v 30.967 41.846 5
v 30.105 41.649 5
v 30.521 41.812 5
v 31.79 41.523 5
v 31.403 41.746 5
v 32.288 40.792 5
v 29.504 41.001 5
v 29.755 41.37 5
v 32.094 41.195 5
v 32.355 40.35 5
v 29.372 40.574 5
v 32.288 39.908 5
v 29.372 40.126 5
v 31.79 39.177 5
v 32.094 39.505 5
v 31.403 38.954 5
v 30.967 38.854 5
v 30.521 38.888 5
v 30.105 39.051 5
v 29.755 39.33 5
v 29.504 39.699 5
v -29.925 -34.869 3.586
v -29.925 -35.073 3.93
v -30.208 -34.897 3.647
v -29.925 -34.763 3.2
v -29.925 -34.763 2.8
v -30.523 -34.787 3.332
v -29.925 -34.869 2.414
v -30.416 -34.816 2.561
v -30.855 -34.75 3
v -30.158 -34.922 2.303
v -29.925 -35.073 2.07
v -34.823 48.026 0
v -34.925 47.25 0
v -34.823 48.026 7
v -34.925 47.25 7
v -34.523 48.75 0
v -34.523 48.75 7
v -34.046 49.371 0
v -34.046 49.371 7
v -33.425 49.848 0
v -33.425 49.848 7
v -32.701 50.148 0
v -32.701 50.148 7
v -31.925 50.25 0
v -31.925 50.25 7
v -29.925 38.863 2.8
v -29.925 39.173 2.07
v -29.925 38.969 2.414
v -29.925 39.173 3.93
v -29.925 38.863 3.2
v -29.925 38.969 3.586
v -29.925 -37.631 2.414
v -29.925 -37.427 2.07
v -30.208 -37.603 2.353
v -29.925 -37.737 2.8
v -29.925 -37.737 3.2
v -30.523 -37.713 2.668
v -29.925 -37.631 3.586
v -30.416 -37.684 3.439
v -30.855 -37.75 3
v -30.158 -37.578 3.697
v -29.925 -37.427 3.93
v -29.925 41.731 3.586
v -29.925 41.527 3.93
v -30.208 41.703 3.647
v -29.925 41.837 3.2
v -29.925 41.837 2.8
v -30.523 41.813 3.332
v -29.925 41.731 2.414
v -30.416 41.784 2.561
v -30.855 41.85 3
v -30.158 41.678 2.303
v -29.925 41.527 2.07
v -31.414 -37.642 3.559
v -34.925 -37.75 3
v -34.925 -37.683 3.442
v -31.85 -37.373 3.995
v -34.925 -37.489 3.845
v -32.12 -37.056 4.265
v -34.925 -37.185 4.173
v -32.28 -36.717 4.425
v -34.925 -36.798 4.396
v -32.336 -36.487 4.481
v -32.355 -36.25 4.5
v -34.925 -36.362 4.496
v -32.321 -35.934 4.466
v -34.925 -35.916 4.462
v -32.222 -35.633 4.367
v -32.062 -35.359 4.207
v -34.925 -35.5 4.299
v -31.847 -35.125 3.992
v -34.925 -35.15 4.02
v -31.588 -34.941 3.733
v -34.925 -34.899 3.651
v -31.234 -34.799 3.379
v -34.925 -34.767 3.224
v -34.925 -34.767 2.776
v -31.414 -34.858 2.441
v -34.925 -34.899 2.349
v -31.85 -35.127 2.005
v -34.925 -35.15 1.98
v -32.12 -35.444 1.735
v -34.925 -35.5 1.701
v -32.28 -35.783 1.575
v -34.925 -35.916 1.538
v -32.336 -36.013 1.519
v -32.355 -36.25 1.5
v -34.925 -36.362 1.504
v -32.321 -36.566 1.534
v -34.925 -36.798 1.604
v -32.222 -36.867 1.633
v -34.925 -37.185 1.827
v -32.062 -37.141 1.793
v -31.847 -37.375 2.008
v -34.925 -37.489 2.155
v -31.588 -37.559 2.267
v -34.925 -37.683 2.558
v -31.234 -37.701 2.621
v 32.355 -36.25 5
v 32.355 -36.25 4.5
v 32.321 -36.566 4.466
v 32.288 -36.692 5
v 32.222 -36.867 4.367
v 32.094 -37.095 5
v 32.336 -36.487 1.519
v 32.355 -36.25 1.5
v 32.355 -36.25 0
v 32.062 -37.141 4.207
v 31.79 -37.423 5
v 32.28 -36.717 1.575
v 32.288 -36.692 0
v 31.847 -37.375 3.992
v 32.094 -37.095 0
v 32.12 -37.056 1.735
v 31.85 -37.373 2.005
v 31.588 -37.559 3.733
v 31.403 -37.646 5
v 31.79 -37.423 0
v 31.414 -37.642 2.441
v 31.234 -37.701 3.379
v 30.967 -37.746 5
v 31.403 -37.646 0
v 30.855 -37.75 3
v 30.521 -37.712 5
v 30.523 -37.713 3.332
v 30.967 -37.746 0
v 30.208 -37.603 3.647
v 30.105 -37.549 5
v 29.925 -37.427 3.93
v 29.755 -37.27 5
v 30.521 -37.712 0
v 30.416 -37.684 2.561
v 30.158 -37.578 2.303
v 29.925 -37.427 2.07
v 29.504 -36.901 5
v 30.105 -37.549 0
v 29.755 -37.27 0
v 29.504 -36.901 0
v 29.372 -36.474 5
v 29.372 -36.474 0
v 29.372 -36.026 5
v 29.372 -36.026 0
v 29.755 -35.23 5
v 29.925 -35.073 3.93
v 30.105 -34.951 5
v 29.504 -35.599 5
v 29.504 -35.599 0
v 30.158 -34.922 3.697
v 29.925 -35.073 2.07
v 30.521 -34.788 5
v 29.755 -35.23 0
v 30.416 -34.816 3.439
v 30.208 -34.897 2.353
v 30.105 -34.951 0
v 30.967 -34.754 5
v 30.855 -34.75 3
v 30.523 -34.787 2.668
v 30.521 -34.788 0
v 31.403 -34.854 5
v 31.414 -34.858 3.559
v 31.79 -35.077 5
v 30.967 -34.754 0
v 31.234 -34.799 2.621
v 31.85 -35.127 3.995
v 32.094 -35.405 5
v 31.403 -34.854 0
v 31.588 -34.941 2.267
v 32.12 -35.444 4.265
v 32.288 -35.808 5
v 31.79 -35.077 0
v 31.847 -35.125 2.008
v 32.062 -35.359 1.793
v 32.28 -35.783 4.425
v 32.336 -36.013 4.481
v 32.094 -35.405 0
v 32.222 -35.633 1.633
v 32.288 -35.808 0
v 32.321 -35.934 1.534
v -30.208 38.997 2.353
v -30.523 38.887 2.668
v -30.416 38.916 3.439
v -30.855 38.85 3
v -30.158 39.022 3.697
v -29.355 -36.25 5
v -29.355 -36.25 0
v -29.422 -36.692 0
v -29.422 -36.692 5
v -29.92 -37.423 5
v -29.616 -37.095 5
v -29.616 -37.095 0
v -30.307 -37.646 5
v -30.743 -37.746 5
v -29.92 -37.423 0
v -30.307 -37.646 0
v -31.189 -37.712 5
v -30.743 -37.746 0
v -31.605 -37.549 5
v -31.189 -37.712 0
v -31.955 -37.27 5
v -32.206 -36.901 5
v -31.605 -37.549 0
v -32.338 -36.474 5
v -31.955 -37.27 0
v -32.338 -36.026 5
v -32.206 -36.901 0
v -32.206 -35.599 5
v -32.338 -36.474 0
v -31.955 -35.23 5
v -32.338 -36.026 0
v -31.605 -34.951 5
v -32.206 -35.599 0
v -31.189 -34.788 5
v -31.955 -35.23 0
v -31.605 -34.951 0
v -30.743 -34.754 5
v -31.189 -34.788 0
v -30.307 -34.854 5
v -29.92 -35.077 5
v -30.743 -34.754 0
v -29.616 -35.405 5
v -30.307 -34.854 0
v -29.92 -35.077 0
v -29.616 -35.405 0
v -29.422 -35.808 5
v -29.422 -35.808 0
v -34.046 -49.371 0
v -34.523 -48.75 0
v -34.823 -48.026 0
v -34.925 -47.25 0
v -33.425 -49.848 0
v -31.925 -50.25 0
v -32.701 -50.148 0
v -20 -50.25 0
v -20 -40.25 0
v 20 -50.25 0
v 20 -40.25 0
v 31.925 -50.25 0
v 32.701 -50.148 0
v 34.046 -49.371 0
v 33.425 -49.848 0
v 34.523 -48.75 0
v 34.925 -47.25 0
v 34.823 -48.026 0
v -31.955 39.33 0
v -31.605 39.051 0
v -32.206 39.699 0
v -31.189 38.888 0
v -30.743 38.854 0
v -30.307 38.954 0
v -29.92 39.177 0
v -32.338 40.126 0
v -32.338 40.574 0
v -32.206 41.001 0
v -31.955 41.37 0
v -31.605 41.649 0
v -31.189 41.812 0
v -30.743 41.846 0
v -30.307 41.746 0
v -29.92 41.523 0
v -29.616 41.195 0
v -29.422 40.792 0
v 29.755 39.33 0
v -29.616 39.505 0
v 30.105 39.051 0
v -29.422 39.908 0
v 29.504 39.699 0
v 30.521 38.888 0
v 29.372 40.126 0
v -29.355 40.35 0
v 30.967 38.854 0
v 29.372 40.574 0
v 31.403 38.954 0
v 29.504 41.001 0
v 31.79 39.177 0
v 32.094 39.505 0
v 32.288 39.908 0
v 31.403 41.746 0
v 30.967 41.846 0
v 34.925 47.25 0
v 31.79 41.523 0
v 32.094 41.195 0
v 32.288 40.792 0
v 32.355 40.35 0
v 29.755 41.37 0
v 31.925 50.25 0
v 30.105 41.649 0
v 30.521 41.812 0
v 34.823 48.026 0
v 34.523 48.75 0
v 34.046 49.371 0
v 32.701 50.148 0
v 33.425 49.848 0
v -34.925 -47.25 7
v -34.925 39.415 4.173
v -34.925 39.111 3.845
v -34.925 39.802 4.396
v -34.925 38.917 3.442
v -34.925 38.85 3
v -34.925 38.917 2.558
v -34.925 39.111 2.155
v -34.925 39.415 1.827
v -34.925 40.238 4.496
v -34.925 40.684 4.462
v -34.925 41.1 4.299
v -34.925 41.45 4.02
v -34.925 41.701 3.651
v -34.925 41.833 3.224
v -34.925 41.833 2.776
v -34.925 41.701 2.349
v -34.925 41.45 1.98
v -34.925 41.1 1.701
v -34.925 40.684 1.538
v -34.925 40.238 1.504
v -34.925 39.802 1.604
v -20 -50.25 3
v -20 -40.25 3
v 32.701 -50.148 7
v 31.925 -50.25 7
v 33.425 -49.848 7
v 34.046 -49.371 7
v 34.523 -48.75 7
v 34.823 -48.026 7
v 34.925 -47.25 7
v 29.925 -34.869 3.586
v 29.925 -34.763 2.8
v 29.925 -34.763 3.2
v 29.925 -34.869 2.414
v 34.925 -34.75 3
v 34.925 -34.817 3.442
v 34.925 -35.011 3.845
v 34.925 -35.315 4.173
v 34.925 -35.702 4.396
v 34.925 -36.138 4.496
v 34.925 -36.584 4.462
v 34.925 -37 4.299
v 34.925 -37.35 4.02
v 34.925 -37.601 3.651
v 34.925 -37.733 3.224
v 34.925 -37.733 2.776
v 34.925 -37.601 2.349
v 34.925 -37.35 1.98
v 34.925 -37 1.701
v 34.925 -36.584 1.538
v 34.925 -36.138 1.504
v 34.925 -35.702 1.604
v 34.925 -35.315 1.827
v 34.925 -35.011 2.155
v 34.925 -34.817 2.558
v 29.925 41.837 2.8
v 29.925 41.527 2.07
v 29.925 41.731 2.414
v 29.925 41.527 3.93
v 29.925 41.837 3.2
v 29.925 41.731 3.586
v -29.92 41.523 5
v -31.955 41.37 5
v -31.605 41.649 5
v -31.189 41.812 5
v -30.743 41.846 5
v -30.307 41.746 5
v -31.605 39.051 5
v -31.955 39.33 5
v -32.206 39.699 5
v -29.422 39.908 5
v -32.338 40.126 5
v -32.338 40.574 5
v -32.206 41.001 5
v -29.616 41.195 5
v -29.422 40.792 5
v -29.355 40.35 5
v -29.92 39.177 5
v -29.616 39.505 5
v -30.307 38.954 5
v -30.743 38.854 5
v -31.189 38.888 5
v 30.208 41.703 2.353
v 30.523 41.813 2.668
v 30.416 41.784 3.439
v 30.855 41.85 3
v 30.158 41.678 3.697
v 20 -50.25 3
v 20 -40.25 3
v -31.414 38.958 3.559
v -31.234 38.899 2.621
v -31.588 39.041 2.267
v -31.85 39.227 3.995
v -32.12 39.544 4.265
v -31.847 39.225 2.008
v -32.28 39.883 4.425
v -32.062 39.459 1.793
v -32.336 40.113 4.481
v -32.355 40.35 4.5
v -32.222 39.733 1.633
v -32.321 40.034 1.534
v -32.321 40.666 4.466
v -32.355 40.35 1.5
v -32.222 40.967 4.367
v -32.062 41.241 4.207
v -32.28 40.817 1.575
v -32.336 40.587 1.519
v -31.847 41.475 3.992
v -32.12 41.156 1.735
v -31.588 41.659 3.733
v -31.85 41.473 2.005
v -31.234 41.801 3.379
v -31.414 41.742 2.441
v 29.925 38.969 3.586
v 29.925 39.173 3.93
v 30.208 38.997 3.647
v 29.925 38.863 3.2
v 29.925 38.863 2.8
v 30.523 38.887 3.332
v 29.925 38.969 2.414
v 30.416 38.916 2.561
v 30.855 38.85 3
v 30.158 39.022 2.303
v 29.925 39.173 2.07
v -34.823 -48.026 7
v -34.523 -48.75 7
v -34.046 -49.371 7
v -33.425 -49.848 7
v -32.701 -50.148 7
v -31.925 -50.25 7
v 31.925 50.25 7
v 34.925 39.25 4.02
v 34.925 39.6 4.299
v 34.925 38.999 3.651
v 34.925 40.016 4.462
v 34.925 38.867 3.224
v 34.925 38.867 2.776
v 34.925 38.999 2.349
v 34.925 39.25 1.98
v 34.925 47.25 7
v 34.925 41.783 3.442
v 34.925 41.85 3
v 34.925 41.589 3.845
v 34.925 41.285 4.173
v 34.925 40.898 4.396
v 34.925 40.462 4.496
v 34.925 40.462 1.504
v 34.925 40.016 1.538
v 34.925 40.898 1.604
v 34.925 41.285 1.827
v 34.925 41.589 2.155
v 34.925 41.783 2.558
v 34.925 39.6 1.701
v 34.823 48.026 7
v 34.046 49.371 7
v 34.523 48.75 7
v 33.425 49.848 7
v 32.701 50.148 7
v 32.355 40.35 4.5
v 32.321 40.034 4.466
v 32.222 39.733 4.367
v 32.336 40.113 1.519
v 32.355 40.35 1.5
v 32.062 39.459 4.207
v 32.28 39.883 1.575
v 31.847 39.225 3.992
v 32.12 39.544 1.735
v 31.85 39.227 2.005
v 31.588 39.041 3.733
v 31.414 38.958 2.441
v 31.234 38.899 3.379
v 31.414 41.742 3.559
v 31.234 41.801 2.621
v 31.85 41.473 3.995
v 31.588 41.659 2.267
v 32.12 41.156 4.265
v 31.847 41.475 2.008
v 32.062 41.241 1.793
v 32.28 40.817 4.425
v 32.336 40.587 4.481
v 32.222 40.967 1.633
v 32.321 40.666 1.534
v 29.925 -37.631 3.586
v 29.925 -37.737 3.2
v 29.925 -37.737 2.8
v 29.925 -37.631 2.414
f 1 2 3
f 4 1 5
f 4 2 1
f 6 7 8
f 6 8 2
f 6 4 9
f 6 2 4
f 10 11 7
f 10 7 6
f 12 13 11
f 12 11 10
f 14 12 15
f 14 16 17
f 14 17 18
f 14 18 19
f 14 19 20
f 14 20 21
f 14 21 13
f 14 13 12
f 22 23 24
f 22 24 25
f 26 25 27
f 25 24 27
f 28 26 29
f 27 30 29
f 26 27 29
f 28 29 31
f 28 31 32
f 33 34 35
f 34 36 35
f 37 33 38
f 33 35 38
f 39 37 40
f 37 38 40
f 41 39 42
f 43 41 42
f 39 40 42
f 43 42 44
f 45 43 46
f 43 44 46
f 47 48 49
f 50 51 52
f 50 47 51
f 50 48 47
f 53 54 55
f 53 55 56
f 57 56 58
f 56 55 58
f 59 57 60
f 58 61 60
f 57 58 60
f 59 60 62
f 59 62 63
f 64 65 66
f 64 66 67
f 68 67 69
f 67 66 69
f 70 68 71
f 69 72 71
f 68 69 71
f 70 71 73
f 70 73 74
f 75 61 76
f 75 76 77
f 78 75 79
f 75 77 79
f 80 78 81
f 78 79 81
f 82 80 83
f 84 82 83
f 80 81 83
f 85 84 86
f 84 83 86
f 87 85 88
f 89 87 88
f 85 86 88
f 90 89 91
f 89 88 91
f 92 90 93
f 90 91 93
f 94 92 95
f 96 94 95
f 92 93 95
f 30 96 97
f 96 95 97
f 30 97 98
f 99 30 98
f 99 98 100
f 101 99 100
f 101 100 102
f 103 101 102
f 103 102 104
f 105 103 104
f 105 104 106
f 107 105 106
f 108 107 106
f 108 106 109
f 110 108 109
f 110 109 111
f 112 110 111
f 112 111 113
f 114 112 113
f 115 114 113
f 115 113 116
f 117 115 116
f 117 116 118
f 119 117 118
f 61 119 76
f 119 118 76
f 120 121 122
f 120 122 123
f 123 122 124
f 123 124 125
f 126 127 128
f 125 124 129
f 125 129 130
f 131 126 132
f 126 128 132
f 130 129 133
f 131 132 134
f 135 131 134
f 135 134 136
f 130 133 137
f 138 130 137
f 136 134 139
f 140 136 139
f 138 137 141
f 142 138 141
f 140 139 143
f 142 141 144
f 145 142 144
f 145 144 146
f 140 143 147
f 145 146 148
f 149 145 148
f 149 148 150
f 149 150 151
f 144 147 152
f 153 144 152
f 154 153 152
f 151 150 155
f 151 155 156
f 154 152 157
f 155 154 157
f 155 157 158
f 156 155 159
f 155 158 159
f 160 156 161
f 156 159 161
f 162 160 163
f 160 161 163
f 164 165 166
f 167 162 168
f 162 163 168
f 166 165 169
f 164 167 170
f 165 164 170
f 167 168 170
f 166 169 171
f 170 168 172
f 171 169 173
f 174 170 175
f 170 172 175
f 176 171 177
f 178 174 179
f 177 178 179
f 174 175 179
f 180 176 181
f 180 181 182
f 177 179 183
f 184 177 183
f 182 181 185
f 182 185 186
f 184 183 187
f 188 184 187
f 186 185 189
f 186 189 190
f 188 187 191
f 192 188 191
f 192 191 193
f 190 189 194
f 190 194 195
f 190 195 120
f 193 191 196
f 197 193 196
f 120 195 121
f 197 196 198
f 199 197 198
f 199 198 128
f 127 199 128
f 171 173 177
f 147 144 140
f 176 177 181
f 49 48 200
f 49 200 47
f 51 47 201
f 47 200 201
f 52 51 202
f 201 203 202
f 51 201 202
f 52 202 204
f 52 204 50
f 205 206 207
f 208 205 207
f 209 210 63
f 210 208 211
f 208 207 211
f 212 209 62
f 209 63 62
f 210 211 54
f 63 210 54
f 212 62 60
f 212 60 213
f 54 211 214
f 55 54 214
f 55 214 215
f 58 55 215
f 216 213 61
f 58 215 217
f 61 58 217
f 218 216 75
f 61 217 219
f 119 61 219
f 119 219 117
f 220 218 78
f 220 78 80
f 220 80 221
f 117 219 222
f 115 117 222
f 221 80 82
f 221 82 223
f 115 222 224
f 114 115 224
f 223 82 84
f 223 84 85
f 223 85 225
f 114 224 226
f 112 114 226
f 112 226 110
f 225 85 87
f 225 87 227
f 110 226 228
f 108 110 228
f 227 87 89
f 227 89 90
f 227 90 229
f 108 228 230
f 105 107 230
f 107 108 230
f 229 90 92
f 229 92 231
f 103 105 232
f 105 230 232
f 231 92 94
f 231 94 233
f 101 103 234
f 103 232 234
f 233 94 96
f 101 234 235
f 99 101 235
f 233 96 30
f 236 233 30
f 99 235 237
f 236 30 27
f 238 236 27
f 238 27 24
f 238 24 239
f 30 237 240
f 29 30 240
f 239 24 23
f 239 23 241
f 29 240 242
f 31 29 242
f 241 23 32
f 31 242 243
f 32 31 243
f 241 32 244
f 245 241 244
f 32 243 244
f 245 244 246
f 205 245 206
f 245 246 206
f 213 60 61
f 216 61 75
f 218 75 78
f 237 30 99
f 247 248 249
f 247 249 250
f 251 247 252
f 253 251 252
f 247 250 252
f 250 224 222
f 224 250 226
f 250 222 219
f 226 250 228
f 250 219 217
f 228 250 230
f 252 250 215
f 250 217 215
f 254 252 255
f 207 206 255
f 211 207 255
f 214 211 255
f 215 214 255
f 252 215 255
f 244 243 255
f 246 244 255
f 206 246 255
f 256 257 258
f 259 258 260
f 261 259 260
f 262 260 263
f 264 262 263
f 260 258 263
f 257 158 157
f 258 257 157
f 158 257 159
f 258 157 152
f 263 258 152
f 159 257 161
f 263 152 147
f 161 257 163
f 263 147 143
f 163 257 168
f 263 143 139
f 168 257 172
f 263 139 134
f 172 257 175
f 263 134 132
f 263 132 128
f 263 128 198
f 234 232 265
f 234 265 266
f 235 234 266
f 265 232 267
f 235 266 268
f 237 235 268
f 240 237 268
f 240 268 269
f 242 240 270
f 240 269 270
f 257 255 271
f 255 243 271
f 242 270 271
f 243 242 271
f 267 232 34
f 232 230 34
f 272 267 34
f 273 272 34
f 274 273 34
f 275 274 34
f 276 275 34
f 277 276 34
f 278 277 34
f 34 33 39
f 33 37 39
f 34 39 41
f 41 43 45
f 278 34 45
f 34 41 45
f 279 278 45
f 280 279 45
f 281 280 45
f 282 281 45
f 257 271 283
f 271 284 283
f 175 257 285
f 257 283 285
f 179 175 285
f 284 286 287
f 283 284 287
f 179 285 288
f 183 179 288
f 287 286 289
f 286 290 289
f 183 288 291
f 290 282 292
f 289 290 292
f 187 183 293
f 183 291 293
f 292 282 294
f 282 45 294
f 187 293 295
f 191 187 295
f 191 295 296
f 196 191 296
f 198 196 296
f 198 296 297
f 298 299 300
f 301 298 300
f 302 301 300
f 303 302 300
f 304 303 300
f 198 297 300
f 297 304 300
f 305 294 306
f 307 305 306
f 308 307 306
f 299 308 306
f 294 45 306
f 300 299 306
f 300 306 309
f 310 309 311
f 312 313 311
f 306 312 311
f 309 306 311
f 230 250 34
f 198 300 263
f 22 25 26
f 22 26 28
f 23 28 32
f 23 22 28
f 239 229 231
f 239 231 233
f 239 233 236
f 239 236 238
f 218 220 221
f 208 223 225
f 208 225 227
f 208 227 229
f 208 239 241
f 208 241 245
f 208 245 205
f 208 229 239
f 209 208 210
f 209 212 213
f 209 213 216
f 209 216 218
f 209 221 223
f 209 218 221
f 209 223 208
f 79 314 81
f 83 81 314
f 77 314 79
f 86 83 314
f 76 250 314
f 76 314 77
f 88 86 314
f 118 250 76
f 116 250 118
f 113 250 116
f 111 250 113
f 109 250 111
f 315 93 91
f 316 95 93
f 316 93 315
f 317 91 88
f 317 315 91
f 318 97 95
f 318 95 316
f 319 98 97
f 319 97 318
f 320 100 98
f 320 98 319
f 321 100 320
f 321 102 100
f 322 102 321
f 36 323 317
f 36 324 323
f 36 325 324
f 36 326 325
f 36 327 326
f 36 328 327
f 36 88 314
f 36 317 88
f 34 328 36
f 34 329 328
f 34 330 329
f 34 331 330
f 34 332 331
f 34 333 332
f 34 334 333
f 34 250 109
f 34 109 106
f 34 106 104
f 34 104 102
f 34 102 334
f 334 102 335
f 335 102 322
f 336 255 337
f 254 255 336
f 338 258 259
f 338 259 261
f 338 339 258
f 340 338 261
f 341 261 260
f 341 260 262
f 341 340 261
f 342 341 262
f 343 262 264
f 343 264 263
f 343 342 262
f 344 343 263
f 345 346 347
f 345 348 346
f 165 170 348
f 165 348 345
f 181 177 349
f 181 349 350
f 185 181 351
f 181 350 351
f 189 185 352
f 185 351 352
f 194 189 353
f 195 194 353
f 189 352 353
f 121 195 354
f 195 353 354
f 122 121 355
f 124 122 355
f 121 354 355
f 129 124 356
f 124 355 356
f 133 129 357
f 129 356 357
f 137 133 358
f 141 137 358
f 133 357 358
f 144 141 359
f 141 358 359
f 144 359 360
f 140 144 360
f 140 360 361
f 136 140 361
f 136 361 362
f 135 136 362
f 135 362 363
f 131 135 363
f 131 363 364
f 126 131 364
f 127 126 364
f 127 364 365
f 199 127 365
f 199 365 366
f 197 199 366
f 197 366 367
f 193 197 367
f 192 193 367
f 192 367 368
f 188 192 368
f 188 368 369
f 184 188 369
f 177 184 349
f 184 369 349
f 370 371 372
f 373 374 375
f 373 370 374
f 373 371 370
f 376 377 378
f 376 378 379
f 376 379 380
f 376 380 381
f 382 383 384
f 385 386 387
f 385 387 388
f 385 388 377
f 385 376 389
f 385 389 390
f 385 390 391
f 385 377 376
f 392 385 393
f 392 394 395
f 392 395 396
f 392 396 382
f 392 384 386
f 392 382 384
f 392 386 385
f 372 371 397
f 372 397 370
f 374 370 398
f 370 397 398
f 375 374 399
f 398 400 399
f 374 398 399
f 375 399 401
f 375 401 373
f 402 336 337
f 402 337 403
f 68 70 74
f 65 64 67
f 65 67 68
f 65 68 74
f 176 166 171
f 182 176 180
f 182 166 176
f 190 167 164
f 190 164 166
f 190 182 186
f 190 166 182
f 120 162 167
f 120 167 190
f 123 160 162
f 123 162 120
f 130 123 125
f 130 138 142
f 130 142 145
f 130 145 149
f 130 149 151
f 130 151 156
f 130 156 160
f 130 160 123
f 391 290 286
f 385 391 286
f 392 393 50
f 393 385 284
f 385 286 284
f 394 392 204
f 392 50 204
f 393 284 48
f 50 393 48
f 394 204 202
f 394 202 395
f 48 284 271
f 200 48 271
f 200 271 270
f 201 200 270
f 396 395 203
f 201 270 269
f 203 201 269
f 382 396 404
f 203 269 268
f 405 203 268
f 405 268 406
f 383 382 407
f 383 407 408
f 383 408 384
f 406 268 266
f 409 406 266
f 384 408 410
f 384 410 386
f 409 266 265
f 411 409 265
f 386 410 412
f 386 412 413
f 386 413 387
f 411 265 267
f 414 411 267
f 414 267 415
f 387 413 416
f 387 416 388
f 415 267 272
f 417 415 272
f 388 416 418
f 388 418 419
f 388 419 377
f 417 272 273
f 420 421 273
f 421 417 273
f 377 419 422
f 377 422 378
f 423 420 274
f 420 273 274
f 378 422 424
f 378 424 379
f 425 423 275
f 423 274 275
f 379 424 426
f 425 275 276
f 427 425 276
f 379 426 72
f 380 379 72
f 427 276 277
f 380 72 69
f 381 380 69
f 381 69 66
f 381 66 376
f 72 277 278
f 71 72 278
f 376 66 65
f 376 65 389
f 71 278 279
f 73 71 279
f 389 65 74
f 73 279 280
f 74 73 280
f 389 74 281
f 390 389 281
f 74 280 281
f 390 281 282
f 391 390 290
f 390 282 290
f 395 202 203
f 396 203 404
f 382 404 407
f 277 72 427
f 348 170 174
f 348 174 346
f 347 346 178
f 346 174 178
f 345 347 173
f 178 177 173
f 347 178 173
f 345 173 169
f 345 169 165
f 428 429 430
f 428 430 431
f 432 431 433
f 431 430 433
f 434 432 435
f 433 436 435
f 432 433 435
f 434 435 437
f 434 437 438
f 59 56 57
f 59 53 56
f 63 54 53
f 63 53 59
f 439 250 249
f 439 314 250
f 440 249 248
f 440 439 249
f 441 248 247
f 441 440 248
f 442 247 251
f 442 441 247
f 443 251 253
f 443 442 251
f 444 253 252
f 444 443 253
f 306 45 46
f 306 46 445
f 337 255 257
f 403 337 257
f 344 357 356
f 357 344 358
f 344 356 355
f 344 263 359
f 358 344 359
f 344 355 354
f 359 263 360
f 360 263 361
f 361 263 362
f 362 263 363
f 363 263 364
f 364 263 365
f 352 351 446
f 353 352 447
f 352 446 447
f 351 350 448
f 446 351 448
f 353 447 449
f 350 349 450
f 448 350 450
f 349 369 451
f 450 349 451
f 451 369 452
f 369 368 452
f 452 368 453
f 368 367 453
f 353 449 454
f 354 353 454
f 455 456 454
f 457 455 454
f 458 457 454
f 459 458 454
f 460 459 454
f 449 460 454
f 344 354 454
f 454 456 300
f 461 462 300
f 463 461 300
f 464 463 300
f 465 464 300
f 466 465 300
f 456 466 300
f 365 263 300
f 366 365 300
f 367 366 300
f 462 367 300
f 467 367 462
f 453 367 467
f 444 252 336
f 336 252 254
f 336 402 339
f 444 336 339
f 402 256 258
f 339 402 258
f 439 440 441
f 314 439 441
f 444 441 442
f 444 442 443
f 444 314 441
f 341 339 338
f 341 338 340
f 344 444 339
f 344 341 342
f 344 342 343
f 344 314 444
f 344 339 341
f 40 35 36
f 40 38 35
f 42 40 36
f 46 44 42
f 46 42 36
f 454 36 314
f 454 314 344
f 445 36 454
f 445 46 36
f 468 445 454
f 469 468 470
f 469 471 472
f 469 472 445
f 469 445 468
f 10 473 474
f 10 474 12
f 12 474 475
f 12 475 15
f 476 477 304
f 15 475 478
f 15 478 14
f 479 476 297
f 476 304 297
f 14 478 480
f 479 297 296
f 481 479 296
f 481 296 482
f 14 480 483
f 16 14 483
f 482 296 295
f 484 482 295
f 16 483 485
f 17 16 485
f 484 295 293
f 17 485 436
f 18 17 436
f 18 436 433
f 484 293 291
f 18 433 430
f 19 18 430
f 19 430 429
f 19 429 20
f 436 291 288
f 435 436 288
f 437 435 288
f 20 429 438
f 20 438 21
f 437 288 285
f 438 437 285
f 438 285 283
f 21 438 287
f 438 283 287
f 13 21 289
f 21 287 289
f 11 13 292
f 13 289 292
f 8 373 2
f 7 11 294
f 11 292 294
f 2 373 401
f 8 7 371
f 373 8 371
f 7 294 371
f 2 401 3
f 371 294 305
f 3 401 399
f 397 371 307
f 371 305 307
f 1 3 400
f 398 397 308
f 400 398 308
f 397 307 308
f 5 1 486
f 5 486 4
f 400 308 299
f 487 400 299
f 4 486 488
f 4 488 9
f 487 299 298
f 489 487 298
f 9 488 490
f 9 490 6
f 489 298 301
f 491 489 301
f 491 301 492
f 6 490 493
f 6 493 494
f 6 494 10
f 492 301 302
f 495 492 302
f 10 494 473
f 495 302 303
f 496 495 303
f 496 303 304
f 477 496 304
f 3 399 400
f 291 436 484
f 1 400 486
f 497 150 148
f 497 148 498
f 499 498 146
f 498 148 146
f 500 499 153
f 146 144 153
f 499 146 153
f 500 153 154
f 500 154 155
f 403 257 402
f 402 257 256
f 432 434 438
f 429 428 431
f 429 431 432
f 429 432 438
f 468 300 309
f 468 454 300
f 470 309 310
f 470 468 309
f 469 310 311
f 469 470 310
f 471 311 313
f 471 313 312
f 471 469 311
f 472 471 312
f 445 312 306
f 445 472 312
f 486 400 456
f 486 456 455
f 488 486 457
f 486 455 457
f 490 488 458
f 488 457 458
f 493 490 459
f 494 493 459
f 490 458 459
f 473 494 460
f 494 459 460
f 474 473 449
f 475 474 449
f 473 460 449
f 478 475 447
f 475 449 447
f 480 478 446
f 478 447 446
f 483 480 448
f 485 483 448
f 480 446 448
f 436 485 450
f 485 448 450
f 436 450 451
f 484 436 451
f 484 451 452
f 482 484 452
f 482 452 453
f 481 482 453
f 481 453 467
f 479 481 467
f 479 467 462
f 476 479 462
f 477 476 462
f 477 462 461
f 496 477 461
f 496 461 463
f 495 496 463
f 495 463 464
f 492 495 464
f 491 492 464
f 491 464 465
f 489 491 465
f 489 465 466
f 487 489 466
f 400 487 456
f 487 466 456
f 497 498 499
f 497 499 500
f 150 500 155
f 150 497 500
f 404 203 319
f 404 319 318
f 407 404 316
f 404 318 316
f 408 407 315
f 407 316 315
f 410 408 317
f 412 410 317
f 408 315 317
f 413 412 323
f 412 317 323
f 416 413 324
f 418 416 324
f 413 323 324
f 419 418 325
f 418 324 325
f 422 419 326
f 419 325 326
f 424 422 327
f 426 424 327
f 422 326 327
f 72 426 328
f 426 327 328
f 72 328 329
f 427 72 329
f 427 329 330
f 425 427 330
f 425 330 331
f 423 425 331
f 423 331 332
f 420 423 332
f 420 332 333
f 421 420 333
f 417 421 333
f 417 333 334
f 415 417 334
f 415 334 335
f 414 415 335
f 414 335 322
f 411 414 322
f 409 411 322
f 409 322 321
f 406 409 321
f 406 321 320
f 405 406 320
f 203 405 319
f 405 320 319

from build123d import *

# Parameters (mm, degrees)
F0_W      = 69.85
F0_H      = 100.5
F1_DEPTH  = 7
F2_R      = 3
F3_R      = 1.5
F4_DEPTH  = 5
F5_R      = 1.5
F6_DEPTH  = 5
F7_W      = 40
F7_H      = 10
F8_DEPTH  = 3
F9_R      = 1.5
F10_DEPTH = 5


with BuildPart() as f1:
    # F0 (on Top) → F1 (new body)
    with BuildSketch(Plane.XY):
        Rectangle(F0_W, F0_H)
    extrude(amount=F1_DEPTH)

    # F2
    f2_edges = [f1.edges().sort_by_distance(p)[0] for p in [
        (34.925, 50.25, 3.5),
        (-34.925, 50.25, 3.5),
        (34.925, -50.25, 3.5),
        (-34.925, -50.25, 3.5),
    ]]
    fillet(f2_edges, radius=F2_R)

    # F3 (on face) → F4 (cut)
    with BuildSketch(Plane.YZ.offset(34.925)):
        with Locations((-36.25, 3)):
            Circle(F3_R)
        with Locations((40.35, 3)):
            Circle(F3_R)
    extrude(amount=-F4_DEPTH, mode=Mode.SUBTRACT)

    # F5 (on face) → F6 (cut)
    with BuildSketch(Plane(origin=(-34.925, 0, 0), x_dir=(0, -1, 0), z_dir=(-1, 0, 0))):
        with Locations((36.25, 3)):
            Circle(F5_R)
        with Locations((-40.35, 3)):
            Circle(F5_R)
    extrude(amount=-F6_DEPTH, mode=Mode.SUBTRACT)

    # F7 (on face) → F8 (cut)
    with BuildSketch(Plane(origin=(0, 0, 0), x_dir=(1, 0, 0), z_dir=(0, 0, -1))):
        with Locations((0, 45.25)):
            Rectangle(F7_W, F7_H)
    extrude(amount=-F8_DEPTH, mode=Mode.SUBTRACT)

    # F9 (on face) → F10 (cut)
    with BuildSketch(Plane(origin=(0, 0, 0), x_dir=(1, 0, 0), z_dir=(0, 0, -1))):
        with Locations((-30.855, 36.25)):
            Circle(F9_R)
        with Locations((-30.855, -40.35)):
            Circle(F9_R)
        with Locations((30.855, -40.35)):
            Circle(F9_R)
        with Locations((30.855, 36.25)):
            Circle(F9_R)
    extrude(amount=-F10_DEPTH, mode=Mode.SUBTRACT)


solid = f1.part
